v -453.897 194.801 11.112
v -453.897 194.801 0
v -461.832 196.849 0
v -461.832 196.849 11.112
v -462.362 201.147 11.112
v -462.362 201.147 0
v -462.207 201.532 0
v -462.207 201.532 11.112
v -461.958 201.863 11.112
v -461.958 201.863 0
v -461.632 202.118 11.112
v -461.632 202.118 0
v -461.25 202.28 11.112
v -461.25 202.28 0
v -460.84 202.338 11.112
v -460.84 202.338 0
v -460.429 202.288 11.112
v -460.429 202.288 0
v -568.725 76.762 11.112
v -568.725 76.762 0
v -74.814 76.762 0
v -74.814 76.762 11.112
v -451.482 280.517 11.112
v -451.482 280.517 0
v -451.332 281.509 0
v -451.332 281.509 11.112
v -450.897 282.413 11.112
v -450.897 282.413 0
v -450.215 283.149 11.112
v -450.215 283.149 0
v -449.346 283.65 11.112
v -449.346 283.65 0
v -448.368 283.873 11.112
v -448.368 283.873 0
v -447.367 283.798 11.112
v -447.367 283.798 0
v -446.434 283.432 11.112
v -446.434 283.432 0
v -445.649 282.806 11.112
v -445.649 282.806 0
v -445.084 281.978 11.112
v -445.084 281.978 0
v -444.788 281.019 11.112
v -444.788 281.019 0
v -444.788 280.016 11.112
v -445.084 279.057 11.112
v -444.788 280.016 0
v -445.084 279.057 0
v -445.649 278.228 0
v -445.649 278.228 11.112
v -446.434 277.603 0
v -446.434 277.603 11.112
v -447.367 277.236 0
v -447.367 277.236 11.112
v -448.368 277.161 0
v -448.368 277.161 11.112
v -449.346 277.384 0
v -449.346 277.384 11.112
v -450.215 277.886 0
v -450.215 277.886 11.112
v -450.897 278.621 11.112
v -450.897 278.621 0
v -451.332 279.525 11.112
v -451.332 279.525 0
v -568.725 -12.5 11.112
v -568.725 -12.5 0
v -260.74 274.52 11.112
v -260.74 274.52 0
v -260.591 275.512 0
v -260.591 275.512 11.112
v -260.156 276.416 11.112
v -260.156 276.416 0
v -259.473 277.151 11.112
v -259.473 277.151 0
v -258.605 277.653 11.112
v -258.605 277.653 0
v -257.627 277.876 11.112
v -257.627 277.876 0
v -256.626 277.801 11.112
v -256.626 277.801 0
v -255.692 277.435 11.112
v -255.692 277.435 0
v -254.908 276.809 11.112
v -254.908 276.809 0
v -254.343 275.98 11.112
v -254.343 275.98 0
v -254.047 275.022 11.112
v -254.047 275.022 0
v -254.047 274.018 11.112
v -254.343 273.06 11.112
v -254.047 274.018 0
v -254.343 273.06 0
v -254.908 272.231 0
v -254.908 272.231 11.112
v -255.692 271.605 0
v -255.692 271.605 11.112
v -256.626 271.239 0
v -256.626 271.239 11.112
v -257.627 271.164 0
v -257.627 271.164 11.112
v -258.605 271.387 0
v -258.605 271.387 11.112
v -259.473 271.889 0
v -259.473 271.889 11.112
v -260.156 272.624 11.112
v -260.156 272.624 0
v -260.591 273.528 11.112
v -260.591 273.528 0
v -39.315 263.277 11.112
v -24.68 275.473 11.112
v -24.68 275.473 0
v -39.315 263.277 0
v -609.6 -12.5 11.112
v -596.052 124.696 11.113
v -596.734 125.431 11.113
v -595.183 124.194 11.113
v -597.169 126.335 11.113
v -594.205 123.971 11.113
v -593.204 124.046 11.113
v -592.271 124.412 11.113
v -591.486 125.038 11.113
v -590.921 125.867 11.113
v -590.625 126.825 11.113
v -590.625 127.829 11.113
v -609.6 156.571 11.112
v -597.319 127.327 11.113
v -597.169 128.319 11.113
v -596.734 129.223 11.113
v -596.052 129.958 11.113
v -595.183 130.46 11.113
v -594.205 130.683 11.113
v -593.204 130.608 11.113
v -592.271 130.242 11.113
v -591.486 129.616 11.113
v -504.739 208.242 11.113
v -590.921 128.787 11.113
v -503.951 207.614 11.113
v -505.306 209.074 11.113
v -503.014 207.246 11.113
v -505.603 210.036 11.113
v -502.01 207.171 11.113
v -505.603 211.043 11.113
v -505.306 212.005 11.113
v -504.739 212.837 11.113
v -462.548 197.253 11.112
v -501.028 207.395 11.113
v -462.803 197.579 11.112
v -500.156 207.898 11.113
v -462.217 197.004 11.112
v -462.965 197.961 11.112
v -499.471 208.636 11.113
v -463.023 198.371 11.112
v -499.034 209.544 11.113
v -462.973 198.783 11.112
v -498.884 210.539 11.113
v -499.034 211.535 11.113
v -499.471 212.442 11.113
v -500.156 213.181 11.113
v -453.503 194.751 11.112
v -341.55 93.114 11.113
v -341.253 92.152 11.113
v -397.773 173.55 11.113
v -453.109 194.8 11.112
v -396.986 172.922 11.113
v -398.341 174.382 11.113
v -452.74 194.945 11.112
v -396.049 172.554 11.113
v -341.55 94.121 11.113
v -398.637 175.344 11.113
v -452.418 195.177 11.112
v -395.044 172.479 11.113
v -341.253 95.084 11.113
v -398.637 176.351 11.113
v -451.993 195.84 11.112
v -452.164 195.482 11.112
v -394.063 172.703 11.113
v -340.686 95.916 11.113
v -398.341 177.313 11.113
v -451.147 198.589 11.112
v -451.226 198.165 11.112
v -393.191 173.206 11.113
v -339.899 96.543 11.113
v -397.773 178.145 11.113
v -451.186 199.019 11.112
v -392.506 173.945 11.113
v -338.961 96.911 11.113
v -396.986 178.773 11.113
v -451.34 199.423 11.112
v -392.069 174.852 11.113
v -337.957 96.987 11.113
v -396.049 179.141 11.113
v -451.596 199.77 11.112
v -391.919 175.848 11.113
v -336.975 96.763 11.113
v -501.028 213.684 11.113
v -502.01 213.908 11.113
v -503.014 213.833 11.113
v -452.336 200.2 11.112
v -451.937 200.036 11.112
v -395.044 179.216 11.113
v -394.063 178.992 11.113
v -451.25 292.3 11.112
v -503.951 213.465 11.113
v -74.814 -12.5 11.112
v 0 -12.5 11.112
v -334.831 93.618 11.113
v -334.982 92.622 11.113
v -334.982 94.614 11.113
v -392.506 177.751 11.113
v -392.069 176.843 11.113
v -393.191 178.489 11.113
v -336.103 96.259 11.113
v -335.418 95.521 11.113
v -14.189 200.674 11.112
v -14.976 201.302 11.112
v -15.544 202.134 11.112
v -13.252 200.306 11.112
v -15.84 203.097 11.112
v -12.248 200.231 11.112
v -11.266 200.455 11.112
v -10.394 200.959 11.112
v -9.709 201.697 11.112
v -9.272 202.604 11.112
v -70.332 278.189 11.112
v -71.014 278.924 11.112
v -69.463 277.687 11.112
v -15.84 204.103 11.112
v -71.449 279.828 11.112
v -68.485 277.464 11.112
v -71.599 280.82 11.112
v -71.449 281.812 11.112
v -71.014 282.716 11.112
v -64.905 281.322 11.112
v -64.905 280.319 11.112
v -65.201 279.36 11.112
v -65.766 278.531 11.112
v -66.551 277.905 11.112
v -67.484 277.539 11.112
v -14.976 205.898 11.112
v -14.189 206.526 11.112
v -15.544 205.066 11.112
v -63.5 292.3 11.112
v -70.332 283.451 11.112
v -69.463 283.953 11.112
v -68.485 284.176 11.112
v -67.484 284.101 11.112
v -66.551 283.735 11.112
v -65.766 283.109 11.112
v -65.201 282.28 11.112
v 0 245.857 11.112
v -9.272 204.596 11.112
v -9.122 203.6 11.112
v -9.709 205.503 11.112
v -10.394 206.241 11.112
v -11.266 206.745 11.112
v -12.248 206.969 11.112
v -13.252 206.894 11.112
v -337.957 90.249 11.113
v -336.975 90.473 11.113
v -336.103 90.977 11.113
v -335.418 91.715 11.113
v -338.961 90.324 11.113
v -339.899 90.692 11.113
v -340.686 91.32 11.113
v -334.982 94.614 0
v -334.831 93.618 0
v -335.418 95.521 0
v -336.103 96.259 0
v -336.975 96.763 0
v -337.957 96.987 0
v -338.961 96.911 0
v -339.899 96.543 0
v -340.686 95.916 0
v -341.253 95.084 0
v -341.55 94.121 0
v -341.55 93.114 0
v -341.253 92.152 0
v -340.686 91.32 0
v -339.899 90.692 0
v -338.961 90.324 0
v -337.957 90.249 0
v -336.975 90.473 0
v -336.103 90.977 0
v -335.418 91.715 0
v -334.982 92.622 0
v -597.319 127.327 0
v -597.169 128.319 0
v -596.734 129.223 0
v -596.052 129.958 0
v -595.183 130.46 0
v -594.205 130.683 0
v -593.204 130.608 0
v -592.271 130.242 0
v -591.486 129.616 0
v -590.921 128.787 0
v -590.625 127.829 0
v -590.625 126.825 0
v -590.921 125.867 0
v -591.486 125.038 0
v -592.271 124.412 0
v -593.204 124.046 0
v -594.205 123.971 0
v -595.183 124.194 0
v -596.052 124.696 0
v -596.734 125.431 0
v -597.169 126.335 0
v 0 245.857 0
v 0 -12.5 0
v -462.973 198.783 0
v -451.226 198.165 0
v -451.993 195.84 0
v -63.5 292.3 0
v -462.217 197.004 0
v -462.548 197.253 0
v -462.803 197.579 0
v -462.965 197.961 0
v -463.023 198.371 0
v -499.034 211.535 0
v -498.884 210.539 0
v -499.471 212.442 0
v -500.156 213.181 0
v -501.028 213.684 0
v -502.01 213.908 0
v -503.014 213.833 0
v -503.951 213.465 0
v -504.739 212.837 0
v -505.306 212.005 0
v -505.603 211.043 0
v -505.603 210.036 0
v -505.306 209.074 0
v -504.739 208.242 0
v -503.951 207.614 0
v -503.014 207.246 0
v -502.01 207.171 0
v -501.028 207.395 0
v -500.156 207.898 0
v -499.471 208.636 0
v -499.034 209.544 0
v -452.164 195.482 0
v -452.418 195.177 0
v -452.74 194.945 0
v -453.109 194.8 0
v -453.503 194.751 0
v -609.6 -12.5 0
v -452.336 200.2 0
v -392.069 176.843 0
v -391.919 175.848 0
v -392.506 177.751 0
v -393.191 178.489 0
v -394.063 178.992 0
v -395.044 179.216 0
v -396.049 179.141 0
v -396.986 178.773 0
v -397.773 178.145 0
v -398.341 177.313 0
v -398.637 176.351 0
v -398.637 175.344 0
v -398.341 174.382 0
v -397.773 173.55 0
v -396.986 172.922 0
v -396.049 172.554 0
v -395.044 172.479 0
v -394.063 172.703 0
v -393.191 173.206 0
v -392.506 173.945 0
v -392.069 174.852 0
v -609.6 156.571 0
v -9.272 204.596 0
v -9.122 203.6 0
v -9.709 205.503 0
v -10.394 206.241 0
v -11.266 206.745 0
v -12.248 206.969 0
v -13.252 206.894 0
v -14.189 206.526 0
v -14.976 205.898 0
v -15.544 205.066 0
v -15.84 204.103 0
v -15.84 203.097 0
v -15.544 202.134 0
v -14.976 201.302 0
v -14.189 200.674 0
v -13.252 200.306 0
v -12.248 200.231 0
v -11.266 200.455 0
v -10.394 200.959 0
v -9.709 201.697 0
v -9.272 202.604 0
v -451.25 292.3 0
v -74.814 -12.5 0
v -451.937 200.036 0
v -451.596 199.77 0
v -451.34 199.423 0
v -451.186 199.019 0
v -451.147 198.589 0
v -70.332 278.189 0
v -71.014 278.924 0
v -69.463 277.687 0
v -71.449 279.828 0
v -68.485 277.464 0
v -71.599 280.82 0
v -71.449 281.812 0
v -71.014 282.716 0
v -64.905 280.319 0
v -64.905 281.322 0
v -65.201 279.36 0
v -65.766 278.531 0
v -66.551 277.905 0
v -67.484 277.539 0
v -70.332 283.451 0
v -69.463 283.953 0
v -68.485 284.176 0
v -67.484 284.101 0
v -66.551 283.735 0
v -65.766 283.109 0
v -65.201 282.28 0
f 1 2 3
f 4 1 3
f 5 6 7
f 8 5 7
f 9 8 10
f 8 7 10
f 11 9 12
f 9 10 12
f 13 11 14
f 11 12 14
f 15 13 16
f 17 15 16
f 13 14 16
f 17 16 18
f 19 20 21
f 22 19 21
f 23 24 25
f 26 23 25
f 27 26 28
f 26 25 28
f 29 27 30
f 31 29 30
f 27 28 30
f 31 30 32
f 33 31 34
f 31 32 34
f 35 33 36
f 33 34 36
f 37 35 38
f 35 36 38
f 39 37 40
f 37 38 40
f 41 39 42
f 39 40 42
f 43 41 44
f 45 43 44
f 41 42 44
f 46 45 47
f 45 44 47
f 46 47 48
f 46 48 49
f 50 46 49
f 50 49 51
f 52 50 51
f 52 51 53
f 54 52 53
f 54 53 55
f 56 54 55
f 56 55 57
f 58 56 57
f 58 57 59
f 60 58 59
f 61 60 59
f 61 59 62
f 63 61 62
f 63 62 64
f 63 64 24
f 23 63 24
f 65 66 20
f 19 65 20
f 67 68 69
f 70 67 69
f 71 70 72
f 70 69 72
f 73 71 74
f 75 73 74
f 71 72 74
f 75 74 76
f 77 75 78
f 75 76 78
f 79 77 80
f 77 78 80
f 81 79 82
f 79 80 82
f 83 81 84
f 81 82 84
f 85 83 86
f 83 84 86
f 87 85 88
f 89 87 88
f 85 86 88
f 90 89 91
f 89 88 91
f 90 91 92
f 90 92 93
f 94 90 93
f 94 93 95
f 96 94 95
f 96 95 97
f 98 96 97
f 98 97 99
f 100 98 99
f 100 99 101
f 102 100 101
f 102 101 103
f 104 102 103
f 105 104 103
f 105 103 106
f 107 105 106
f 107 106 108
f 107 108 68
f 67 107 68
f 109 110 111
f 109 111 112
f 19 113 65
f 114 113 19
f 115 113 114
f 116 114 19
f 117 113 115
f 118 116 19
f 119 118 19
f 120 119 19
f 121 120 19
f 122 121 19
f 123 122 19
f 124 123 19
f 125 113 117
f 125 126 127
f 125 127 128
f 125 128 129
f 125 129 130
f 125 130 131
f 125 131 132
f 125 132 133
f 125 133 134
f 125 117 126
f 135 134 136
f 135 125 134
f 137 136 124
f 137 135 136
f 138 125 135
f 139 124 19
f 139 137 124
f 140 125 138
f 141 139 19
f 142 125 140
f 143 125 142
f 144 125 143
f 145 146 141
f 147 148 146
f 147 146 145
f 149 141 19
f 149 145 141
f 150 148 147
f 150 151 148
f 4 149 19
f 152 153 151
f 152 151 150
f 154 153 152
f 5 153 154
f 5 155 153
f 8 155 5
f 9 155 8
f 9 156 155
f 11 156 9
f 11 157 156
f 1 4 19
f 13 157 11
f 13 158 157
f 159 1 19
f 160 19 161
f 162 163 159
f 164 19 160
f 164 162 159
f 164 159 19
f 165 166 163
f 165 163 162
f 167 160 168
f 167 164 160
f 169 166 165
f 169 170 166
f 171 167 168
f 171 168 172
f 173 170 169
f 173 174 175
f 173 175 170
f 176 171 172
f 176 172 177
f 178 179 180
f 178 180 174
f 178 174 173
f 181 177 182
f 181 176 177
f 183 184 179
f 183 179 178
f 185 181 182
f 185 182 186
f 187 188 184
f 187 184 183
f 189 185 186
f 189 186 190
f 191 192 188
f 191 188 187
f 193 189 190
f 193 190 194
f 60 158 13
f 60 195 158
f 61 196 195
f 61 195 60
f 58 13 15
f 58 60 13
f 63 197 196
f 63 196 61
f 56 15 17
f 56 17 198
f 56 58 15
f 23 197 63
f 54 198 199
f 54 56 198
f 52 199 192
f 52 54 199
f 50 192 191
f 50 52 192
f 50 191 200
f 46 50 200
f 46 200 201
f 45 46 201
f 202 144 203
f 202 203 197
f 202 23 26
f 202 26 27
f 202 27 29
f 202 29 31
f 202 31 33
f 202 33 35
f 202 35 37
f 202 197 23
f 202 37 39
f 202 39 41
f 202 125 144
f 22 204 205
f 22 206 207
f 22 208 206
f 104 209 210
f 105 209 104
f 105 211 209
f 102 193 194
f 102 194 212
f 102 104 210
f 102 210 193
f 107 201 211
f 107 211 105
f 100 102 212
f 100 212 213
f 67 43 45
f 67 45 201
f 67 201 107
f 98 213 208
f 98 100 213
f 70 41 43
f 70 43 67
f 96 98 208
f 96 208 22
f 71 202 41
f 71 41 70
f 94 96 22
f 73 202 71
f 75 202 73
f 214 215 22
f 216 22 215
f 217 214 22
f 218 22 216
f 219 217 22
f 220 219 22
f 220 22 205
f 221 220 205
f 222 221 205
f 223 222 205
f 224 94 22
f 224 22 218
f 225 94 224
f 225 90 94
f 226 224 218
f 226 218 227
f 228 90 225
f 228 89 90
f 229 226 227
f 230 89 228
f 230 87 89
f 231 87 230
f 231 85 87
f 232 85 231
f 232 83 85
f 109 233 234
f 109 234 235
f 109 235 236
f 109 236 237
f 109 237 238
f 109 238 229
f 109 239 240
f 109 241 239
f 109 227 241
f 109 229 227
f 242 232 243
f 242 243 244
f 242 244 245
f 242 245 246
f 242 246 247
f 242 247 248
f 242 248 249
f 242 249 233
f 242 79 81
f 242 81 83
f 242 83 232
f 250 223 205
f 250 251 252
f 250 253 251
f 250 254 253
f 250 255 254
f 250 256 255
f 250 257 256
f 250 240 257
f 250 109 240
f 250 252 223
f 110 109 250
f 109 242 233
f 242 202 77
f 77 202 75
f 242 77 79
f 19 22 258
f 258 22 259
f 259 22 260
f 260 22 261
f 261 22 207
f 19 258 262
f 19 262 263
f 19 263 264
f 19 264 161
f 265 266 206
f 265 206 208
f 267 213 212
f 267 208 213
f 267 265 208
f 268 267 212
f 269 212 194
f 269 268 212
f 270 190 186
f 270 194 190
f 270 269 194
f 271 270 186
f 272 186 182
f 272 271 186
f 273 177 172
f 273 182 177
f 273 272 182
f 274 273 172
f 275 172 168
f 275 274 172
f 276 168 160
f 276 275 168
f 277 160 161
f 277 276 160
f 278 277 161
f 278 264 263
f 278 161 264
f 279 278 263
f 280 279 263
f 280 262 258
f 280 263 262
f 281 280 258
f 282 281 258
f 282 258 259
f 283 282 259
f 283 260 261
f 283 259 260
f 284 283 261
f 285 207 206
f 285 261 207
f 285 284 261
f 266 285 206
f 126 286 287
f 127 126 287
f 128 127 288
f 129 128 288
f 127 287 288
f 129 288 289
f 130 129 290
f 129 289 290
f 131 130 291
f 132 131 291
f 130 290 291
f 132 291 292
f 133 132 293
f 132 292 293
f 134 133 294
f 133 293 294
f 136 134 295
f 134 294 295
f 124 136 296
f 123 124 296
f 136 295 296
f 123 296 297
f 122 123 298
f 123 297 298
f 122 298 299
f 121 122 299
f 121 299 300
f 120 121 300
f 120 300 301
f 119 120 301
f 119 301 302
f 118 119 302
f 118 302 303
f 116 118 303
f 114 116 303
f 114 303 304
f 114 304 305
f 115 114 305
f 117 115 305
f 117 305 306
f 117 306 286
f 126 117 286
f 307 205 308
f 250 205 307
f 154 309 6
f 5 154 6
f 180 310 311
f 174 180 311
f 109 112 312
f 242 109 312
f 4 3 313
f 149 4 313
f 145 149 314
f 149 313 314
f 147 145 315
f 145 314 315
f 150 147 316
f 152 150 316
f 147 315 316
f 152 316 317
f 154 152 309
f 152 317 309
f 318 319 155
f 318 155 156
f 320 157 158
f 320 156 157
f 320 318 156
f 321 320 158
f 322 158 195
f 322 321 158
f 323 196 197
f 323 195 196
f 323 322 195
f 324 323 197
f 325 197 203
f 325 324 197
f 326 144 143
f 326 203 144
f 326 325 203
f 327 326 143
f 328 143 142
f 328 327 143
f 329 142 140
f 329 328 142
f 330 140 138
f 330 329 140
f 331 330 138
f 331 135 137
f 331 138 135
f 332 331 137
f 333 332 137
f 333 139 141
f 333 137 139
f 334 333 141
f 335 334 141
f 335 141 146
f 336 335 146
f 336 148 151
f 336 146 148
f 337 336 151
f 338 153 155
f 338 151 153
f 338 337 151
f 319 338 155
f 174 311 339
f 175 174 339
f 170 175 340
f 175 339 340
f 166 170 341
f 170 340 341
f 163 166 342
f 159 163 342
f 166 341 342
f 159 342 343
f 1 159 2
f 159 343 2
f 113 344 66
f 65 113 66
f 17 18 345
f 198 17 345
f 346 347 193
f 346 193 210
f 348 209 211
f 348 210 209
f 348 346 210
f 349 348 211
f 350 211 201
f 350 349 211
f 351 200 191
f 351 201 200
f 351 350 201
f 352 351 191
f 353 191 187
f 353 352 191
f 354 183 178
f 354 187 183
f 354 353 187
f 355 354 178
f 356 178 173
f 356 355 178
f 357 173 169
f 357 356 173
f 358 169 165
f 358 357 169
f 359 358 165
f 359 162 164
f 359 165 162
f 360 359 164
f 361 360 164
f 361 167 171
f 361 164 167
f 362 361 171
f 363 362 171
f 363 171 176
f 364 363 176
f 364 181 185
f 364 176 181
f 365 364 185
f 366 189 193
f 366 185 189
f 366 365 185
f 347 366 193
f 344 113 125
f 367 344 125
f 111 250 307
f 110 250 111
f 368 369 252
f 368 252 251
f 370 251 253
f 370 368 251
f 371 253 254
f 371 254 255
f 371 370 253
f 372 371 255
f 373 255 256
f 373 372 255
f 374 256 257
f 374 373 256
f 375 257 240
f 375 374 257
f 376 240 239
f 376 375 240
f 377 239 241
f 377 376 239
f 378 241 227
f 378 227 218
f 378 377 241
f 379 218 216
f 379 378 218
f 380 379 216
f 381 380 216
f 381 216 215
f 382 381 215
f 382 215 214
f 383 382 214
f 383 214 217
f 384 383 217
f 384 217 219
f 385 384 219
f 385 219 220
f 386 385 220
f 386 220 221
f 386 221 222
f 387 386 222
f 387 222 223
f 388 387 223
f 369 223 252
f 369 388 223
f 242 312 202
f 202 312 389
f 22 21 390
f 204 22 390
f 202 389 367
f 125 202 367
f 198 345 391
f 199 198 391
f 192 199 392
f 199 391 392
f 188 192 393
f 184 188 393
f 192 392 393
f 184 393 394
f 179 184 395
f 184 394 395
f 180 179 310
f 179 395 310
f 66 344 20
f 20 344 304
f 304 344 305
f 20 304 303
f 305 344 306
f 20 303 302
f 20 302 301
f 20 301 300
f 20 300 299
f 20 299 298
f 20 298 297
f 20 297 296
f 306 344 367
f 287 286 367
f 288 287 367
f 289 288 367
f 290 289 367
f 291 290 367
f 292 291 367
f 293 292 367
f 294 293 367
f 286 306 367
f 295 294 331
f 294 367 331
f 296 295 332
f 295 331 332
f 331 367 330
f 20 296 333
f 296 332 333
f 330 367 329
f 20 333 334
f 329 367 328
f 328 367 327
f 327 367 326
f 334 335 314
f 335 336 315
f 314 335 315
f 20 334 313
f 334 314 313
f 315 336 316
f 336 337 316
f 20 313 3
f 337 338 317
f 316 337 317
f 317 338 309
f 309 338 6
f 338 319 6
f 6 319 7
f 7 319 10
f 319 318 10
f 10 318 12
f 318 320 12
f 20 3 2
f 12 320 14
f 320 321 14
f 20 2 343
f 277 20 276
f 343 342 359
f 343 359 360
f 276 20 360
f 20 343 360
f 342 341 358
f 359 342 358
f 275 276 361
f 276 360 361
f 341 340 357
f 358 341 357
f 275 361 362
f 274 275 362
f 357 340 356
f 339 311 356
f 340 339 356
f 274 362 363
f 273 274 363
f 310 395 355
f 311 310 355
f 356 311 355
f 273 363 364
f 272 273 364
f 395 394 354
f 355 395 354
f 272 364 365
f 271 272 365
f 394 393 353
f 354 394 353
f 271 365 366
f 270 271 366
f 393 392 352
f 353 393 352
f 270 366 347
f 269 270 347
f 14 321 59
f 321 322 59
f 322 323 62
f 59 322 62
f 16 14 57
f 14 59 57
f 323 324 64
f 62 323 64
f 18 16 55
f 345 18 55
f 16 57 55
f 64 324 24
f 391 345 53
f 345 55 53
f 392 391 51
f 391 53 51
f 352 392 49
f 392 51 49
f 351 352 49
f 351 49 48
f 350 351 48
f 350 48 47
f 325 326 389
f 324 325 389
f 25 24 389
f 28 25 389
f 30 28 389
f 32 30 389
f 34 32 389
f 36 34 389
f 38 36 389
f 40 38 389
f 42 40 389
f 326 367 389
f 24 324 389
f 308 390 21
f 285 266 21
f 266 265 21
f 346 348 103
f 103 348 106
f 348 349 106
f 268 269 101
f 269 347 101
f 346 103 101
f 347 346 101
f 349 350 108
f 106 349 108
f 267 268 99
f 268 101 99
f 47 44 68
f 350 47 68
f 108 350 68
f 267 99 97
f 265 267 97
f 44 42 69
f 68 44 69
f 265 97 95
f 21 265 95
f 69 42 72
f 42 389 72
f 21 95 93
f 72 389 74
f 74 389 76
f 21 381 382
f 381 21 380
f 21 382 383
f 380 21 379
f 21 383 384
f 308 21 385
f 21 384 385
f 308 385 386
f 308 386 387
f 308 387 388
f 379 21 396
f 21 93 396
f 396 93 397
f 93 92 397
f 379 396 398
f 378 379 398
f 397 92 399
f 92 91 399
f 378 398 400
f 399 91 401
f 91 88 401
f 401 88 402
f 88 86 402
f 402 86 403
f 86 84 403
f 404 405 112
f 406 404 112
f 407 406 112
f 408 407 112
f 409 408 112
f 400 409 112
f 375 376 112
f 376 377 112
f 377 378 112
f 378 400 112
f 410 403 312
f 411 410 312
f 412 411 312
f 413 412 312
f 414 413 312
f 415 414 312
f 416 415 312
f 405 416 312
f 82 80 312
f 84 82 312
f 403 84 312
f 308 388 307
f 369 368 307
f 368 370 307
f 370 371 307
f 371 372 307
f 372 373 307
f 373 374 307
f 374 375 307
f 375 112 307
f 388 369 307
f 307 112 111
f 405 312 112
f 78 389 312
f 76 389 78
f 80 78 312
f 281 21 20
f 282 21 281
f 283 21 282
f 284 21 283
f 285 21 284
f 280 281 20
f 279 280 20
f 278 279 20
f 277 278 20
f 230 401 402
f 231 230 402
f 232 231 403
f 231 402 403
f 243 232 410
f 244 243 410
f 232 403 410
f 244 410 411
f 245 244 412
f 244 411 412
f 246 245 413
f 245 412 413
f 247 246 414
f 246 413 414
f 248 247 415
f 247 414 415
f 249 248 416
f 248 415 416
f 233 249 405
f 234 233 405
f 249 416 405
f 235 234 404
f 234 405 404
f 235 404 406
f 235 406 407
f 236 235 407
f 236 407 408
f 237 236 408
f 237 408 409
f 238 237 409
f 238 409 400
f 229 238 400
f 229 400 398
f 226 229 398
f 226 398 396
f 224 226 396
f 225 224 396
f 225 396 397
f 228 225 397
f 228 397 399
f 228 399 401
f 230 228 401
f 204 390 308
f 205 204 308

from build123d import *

# Parameters (mm, degrees)
SKETCH1_R               = 3.3782
BOSS_EXTRUDE1_DEPTH     = 11.1125
SKETCH2_R               = 3.3655
CUT_EXTRUDE1_DEPTH      = 422.26425461
SKETCH3_R               = 3.3655
CUT_EXTRUDE2_DEPTH      = 422.154164722
SKETCH4_R               = 3.3655
CUT_EXTRUDE3_DEPTH      = 422.154164722
SKETCH5_R               = 3.3655
CUT_EXTRUDE4_DEPTH      = 422.154164722
CUT_EXTRUDE5_DEPTH      = 422.369531068
CUT_EXTRUDE5_DEPTH_BACK = 422.369531068
SKETCH6_R               = 3.3782
SKETCH7_W               = 19.45
SKETCH7_H               = 169.071428571
CUT_EXTRUDE6_DEPTH      = 694.733868394
BOSS_EXTRUDE2_DEPTH     = 11.1125


with BuildPart() as part:
    # Sketch1 → Boss-Extrude1 (new body)
    with BuildSketch(Plane.XY):
        Polygon((-629.05, -12.5), (-568.725, -12.5), (-568.725, 76.762), (-74.813700004, 76.762), (-74.813700004, -12.5), (0, -12.5), (0, 216.1), (-63.5, 292.3), (-451.25, 292.3), (-629.05, 139.9), align=None)
        with Locations((-12.5, 203.6)):
            Circle(SKETCH1_R, mode=Mode.SUBTRACT)
        with BuildLine():
            Line((-460.428573591, 202.287851535), (-452.336342065, 200.199533722))
            ThreePointArc((-452.336342065, 200.199533722), (-451.339589022, 199.42298326), (-451.225592299, 198.164590635))
            Line((-451.225592299, 198.164590635), (-451.993143659, 195.840315389))
            ThreePointArc((-451.993143659, 195.840315389), (-452.739984992, 194.944683826), (-453.897256136, 194.800977973))
            Line((-453.897256136, 194.800977973), (-461.832222689, 196.848711278))
            ThreePointArc((-461.832222689, 196.848711278), (-462.802959706, 197.57942531), (-462.972681585, 198.782532884))
            Line((-462.972681585, 198.782532884), (-462.362395197, 201.147392639))
            ThreePointArc((-462.362395197, 201.147392639), (-461.631681165, 202.118129655), (-460.428573591, 202.287851535))
        make_face(mode=Mode.SUBTRACT)
    extrude(amount=BOSS_EXTRUDE1_DEPTH)

    # Sketch2 → Cut-Extrude1 (cut, through all)
    with BuildSketch(Plane(origin=(-305, 23.6125, -5.08), x_dir=(-1, 0, 0), z_dir=(0, 0, -1))):
        with Locations((288.9533823, 103.7145)):
            Circle(SKETCH2_R)
    extrude(amount=-CUT_EXTRUDE1_DEPTH, mode=Mode.SUBTRACT)

    # Sketch3 → Cut-Extrude2 (cut, through all)
    with BuildSketch(Plane(origin=(-305, 23.6125, -1.905), x_dir=(-1, 0, 0), z_dir=(0, 0, -1))):
        with Locations((143.116254523, 256.904809604)):
            Circle(SKETCH3_R)
    extrude(amount=-CUT_EXTRUDE2_DEPTH, mode=Mode.SUBTRACT)

    # Sketch4 → Cut-Extrude3 (cut, through all)
    with BuildSketch(Plane(origin=(-305, 23.6125, -1.905), x_dir=(-1, 0, 0), z_dir=(0, 0, -1))):
        with Locations((-47.625, 250.9075)):
            Circle(SKETCH4_R)
    extrude(amount=-CUT_EXTRUDE3_DEPTH, mode=Mode.SUBTRACT)

    # Sketch5 → Cut-Extrude4 (cut, through all)
    with BuildSketch(Plane(origin=(-305, 23.6125, -1.905), x_dir=(-1, 0, 0), z_dir=(0, 0, -1))):
        with Locations((-236.766660116, 257.207608298)):
            Circle(SKETCH5_R)
    extrude(amount=-CUT_EXTRUDE4_DEPTH, mode=Mode.SUBTRACT)

    # Sketch6 → Cut-Extrude5 (cut, two sides: drawn at the far end of the back side and taken through both)
    with BuildSketch(Plane(origin=(-305, 23.6125, 18.7325), x_dir=(1, 0, 0), z_dir=(0, 0, 1)).offset(-CUT_EXTRUDE5_DEPTH_BACK)):
        with Locations((-197.262125611, 186.926969688)):
            Circle(SKETCH6_R)
        with Locations((-33.209654284, 70.005387803)):
            Circle(SKETCH6_R)
        with Locations((-90.296950895, 152.235012548)):
            Circle(SKETCH6_R)
    extrude(amount=CUT_EXTRUDE5_DEPTH + CUT_EXTRUDE5_DEPTH_BACK, mode=Mode.SUBTRACT)

    # Sketch7 → Cut-Extrude6 (cut, through all)
    with BuildSketch(Plane.XY.offset(11.1125)):
        with Locations((-619.325, 72.035714286)):
            Rectangle(SKETCH7_W, SKETCH7_H)
    extrude(amount=-CUT_EXTRUDE6_DEPTH, mode=Mode.SUBTRACT)

    # Sketch9 → Boss-Extrude2 (add)
    with BuildSketch(Plane.XY.offset(11.1125)):
        Polygon((0, 216.1), (0, 245.857051265), (-24.6799078, 275.472940625), (-39.314523176, 263.277427812), align=None)
    extrude(amount=-BOSS_EXTRUDE2_DEPTH)


solid = part.part
